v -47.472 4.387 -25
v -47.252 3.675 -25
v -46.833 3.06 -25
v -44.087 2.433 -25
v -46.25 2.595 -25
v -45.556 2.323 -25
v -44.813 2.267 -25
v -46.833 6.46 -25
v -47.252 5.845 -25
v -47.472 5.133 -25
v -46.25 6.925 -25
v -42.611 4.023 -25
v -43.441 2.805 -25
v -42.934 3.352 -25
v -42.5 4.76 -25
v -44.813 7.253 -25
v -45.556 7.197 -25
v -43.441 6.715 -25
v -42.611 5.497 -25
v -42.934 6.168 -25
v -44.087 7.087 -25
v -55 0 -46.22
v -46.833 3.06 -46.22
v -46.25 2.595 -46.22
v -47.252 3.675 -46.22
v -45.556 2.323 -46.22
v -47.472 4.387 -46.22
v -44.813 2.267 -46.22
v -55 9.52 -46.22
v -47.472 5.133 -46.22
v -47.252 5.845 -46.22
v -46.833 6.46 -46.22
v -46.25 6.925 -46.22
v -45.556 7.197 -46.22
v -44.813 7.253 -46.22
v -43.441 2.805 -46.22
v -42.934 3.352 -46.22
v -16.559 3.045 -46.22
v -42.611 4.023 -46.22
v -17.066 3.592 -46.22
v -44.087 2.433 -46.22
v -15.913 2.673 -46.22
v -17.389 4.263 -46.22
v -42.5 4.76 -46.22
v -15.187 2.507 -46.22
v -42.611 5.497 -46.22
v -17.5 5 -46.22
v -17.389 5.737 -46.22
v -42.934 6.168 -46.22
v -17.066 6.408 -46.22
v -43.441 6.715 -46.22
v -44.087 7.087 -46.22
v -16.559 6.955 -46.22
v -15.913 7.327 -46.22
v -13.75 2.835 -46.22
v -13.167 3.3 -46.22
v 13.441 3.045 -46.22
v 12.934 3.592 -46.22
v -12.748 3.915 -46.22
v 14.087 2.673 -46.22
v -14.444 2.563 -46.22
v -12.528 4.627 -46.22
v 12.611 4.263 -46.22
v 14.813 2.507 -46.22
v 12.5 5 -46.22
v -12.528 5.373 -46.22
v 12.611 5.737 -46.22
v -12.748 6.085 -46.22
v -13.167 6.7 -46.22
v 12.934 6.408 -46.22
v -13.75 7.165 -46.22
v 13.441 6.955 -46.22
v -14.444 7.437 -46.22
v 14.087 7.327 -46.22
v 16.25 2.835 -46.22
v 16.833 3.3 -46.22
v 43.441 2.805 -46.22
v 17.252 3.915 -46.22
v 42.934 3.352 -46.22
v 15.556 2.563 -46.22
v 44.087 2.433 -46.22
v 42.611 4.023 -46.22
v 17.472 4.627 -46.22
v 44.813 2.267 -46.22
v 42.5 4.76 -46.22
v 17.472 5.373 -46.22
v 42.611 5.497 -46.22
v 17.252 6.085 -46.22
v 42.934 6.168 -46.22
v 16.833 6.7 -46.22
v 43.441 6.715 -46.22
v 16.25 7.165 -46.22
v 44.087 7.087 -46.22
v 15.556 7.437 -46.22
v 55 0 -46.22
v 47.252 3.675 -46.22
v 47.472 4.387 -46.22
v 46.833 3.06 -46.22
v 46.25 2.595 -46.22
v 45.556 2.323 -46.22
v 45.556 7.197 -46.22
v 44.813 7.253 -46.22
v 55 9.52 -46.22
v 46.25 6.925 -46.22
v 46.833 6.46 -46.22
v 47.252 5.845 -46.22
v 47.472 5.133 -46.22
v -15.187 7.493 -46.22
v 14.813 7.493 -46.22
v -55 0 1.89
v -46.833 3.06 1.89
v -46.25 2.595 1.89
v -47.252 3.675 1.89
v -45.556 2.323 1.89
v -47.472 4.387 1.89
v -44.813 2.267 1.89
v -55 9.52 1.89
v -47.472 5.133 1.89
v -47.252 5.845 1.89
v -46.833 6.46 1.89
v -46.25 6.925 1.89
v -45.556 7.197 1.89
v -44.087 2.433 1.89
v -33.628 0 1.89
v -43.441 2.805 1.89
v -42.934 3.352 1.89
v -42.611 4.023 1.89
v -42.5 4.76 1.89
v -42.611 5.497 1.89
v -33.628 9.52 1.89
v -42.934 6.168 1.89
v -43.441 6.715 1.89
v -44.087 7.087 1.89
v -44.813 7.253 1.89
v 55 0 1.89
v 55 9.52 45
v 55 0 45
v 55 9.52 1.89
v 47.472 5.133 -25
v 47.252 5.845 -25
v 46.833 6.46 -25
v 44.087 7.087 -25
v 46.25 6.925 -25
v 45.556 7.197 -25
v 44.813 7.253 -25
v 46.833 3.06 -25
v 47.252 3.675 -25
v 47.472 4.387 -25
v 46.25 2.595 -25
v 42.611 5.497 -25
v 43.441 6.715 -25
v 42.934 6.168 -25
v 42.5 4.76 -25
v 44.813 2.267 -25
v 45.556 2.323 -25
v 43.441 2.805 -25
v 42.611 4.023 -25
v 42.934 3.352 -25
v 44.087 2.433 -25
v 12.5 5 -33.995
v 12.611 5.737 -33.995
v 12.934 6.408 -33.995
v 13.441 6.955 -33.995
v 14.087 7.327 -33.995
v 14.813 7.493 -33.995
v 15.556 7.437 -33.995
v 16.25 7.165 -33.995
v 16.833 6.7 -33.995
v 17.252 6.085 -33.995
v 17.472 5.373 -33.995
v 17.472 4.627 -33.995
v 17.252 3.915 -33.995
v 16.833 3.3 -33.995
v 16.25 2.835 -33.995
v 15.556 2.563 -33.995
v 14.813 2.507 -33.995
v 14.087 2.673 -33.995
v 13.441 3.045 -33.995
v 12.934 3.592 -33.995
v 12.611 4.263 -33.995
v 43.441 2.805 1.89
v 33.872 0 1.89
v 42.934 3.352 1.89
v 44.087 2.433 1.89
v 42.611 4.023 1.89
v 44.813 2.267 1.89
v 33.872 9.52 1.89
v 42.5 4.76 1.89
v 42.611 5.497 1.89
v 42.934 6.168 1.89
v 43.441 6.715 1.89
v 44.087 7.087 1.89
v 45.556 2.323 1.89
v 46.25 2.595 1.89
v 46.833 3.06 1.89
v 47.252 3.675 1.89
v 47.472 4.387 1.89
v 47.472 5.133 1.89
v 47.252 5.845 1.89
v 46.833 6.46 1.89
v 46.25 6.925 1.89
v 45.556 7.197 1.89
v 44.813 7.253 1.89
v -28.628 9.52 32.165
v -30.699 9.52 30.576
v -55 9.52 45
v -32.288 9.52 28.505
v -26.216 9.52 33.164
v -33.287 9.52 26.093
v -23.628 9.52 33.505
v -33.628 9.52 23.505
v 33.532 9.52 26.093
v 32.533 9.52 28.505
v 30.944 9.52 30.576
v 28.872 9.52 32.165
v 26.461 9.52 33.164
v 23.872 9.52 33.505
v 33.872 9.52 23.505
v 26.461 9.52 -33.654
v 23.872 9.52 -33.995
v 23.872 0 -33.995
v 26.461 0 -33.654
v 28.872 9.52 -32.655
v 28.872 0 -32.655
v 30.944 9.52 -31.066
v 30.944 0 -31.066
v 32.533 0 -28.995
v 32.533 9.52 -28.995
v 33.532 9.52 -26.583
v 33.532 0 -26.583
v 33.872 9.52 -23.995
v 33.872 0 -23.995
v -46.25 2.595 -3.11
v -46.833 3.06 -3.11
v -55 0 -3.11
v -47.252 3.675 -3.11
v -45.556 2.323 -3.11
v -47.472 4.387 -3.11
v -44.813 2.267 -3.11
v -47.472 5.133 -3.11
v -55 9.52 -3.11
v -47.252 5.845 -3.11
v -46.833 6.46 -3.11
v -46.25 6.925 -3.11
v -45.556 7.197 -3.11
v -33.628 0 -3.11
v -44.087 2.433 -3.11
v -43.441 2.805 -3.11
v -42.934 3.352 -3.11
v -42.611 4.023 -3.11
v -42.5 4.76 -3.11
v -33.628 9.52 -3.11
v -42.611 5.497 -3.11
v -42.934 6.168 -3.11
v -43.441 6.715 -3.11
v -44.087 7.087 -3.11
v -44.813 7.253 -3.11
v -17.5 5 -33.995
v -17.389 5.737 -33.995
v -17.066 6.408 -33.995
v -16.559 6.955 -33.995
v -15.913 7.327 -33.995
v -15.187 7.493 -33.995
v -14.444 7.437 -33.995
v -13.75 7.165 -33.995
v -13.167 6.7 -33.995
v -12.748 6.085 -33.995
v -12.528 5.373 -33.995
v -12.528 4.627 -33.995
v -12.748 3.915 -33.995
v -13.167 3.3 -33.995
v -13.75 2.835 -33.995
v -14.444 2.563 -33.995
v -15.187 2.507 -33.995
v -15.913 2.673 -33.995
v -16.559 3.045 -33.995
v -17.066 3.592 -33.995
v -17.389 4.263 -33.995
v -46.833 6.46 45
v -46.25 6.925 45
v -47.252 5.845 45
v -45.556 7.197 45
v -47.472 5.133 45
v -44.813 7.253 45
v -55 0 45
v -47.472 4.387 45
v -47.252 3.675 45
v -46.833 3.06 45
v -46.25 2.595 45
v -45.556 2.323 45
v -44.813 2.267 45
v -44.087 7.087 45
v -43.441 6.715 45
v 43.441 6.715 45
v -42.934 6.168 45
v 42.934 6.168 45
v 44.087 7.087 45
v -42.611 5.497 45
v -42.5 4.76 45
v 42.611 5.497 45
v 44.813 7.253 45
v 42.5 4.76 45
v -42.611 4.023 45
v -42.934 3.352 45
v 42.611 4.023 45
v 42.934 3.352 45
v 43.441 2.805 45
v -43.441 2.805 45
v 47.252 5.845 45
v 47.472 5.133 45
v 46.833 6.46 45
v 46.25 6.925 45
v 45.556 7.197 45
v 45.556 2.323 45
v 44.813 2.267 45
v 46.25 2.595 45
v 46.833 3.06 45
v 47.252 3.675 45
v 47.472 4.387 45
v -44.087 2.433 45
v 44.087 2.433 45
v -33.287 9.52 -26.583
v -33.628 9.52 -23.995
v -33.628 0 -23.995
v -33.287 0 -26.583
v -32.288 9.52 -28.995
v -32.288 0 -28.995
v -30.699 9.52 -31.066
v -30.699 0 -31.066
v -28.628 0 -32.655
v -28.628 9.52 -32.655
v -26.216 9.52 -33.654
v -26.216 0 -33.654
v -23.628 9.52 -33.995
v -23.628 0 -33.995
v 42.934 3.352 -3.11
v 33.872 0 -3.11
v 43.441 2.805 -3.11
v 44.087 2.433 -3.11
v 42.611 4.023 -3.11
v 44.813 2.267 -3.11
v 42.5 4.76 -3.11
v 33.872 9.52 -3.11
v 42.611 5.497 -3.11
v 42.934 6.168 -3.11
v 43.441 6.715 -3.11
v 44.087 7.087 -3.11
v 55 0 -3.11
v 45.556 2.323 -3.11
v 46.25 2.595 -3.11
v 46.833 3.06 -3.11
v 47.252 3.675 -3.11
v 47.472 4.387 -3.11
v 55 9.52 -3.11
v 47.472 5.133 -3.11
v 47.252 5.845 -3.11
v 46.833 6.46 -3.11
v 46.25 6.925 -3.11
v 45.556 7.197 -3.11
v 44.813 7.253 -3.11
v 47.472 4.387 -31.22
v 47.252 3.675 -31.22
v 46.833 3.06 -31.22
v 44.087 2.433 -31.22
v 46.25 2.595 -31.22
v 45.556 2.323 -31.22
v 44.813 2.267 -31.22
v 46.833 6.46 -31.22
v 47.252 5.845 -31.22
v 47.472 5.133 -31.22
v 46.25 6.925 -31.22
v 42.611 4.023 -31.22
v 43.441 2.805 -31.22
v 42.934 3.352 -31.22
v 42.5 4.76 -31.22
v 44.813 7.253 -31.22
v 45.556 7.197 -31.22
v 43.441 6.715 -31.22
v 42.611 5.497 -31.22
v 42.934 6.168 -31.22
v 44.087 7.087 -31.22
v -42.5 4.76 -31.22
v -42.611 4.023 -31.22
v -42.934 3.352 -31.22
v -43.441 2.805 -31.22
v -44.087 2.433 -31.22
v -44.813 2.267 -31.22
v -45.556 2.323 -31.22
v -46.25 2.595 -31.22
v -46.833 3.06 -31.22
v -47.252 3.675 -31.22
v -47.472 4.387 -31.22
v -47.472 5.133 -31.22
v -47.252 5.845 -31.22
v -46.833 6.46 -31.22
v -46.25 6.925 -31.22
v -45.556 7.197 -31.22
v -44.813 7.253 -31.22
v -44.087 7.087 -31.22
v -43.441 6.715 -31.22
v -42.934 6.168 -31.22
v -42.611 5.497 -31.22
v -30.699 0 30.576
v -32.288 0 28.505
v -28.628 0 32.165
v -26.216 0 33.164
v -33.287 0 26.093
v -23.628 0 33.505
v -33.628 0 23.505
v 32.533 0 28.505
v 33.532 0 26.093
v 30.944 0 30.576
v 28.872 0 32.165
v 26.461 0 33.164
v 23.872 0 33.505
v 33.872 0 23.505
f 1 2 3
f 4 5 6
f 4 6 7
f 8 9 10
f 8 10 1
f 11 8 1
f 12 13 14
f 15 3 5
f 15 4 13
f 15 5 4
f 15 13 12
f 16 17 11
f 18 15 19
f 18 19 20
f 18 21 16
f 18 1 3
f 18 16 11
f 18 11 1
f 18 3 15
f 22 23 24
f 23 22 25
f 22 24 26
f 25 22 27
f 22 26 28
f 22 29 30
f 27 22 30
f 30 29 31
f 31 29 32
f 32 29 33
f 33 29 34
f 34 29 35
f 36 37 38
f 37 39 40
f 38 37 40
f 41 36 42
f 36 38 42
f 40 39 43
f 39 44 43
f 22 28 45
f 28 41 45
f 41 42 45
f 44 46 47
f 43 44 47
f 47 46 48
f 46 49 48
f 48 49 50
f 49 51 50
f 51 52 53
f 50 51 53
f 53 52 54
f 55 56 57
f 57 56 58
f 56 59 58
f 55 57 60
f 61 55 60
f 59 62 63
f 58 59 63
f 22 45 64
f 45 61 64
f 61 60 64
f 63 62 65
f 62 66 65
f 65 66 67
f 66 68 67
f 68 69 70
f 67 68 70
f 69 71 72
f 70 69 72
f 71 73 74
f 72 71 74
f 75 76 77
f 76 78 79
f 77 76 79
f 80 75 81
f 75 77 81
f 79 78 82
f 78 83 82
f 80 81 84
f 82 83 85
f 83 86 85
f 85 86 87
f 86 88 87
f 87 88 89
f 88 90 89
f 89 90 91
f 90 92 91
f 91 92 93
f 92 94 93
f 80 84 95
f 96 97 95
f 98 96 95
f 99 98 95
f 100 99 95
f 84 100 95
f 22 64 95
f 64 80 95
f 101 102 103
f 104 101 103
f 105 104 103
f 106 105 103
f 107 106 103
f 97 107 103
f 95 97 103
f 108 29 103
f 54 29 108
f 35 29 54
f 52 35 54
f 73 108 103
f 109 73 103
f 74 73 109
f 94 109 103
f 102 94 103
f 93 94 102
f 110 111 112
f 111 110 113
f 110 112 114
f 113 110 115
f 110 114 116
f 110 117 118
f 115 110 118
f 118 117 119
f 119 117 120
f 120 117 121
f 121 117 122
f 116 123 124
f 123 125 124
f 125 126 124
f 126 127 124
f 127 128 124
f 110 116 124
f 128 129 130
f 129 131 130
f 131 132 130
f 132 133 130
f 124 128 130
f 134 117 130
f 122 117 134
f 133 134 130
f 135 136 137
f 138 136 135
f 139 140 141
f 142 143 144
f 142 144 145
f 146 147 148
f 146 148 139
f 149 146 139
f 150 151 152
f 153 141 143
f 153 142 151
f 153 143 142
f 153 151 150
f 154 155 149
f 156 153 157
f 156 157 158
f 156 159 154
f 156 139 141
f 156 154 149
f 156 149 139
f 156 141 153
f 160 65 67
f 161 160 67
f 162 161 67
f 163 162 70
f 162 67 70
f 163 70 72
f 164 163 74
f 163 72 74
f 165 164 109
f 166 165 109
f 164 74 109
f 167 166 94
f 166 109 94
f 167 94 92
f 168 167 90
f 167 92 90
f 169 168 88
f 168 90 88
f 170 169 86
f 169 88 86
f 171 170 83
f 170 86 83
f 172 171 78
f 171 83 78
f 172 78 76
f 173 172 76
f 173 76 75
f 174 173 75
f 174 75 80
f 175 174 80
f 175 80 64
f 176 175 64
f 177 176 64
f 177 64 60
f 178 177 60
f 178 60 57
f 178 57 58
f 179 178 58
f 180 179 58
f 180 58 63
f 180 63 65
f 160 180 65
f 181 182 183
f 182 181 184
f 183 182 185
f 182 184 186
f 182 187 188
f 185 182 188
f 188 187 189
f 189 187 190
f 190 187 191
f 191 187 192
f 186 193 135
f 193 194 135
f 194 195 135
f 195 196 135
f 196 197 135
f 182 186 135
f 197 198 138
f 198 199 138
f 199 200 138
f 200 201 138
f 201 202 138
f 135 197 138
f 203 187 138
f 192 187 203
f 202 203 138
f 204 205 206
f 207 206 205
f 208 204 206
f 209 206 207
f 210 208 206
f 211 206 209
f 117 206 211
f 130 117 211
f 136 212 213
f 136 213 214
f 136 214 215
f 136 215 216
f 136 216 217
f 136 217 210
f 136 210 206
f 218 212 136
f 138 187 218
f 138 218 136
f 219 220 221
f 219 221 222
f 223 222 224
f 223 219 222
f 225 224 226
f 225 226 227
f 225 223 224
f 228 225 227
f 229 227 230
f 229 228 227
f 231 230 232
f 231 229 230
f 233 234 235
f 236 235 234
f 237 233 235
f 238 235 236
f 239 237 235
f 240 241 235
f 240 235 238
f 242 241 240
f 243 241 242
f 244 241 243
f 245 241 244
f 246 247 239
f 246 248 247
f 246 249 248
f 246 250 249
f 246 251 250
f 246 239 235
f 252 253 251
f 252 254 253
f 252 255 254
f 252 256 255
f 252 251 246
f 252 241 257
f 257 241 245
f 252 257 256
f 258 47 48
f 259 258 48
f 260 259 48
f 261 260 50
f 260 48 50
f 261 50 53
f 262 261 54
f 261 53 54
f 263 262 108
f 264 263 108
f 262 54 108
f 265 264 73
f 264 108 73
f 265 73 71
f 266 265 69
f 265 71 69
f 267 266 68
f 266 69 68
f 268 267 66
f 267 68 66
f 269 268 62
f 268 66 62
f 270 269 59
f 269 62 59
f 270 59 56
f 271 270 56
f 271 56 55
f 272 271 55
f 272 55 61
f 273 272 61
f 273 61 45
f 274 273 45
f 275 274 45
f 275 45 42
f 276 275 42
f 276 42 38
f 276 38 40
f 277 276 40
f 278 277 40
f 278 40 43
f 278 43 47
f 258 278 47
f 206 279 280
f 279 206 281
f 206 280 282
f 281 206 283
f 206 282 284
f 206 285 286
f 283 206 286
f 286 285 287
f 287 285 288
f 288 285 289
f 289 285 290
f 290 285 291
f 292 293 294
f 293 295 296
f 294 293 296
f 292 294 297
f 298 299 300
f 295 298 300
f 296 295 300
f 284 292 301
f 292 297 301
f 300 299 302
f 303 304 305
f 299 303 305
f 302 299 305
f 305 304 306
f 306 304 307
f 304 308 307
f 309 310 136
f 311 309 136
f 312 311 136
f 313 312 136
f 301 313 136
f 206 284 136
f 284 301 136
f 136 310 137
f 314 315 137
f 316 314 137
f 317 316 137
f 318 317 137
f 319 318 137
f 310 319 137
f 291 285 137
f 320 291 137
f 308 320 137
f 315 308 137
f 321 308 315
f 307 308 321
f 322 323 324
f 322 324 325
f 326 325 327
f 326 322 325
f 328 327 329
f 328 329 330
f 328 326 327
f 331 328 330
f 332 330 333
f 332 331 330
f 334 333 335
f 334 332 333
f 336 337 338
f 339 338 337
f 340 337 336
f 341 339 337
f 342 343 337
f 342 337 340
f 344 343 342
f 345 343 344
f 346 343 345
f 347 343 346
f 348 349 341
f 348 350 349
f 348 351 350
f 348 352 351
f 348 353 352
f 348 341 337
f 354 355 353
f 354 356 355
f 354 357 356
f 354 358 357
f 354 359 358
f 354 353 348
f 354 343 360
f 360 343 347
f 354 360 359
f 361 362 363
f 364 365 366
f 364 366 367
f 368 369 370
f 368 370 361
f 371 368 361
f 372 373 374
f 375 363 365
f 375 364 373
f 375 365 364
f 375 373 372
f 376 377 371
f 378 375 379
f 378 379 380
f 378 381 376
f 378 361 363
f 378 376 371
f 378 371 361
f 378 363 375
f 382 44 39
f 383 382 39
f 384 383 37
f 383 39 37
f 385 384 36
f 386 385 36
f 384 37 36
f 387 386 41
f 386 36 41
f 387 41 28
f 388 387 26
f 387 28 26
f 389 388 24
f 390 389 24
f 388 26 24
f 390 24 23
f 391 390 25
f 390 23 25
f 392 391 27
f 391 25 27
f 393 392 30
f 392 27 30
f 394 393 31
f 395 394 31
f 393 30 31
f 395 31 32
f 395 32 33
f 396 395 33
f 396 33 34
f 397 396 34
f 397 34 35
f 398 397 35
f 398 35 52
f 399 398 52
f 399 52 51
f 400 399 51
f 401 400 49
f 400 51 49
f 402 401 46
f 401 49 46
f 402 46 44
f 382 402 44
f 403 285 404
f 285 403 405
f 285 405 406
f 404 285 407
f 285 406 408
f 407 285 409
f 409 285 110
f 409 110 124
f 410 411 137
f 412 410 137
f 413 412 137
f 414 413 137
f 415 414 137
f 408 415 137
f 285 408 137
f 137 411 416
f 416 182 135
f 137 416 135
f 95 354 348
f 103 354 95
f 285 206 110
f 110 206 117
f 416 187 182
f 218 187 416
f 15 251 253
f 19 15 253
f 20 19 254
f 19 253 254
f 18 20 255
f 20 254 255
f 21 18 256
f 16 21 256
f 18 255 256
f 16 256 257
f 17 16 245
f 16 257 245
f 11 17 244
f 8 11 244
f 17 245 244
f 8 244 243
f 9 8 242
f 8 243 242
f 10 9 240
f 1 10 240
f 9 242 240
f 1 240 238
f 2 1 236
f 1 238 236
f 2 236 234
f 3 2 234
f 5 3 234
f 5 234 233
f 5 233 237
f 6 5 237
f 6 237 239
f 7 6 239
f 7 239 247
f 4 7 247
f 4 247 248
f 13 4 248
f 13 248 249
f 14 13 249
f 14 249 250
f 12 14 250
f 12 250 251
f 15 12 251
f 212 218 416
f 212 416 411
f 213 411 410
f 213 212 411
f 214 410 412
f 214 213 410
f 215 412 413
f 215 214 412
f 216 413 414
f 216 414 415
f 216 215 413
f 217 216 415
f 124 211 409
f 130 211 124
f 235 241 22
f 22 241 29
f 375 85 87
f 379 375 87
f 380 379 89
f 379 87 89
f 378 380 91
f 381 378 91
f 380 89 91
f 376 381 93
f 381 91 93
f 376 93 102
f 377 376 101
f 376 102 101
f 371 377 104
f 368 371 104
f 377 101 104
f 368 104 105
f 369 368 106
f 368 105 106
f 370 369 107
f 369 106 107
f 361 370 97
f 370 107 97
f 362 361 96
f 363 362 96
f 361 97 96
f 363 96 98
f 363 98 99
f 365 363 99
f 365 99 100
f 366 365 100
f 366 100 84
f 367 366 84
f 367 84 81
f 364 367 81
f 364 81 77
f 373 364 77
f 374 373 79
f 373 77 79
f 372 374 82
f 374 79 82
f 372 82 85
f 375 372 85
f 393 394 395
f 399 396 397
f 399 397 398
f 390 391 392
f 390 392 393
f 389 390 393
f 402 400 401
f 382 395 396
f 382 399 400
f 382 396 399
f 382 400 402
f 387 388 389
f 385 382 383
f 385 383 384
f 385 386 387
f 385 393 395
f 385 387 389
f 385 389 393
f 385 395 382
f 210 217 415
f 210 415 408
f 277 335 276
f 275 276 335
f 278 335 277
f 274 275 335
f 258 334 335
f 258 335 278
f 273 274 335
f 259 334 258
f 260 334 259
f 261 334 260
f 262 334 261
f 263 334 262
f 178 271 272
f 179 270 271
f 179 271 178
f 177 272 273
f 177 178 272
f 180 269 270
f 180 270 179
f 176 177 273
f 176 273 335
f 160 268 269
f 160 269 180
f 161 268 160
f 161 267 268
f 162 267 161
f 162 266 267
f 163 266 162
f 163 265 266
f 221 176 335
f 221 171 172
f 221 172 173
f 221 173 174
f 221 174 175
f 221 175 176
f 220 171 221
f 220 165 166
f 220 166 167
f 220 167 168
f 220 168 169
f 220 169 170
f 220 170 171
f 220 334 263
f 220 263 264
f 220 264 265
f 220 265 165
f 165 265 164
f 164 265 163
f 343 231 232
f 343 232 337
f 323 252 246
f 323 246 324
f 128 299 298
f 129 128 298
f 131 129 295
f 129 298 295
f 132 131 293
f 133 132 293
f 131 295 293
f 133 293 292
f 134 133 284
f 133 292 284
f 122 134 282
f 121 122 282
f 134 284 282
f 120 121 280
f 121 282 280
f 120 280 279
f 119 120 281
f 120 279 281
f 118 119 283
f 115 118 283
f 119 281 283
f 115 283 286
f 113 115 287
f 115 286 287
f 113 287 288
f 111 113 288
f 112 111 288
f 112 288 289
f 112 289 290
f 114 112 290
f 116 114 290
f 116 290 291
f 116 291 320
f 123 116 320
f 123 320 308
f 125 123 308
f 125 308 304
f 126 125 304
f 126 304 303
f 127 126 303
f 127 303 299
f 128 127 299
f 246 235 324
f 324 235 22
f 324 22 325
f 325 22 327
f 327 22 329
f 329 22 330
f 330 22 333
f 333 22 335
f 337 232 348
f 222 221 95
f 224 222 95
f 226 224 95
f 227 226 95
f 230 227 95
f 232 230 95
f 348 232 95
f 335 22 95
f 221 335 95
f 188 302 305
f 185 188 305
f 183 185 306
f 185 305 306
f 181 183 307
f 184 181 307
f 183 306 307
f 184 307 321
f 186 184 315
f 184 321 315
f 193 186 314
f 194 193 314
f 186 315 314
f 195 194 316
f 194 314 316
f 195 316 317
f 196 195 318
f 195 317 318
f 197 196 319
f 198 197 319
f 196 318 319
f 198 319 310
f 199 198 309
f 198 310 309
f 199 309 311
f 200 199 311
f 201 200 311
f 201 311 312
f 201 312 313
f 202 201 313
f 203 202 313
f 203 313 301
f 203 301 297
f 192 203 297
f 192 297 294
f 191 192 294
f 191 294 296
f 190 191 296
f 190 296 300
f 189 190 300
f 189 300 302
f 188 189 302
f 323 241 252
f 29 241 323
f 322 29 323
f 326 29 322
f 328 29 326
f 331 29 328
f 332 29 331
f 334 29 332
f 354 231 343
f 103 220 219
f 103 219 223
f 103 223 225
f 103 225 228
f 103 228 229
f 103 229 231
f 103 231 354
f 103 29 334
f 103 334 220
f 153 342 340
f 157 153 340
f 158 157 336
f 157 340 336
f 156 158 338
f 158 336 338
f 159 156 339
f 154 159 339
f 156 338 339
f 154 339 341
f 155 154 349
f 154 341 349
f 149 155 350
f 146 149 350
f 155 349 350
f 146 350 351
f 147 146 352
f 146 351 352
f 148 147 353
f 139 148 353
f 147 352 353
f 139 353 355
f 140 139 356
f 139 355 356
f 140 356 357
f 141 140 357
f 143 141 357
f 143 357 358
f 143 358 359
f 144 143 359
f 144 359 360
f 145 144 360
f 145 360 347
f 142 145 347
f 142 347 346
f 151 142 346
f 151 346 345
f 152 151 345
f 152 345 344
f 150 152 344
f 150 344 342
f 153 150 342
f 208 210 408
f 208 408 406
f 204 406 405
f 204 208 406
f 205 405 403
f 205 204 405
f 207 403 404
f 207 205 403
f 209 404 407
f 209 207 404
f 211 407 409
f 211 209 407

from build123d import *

# Parameters (mm, degrees)
ESBO_O1_W                = 110
ESBO_O1_H                = 90
RESSALTO_EXTRUS_O1_DEPTH = 9.52
ESBO_O6_W                = 110
ESBO_O6_H                = 1.22
RESSALTO_EXTRUS_O3_DEPTH = 9.52
CORTE_EXTRUS_O6_DEPTH    = 9.52
ESBO_O9_W                = 110
ESBO_O9_H                = 5
CORTE_EXTRUS_O7_DEPTH    = 9.52
ESBO_O10_R               = 2.5
CORTE_EXTRUS_O8_DEPTH    = 70
ESBO_O7_R                = 2.5
CORTE_EXTRUS_O9_DEPTH    = 15


with BuildPart() as part:
    # Esboço1 → Ressalto-extrusão1 (new body)
    with BuildSketch(Plane(origin=(0, 0, 0), x_dir=(1, 0, 0), z_dir=(0, 1, 0))):
        Rectangle(ESBO_O1_W, ESBO_O1_H)
    extrude(amount=RESSALTO_EXTRUS_O1_DEPTH)

    # Esboço6 → Ressalto-extrusão3 (add)
    with BuildSketch(Plane(origin=(0, 9.52, 0), x_dir=(1, 0, 0), z_dir=(0, 1, 0))):
        with Locations((0, 45.61)):
            Rectangle(ESBO_O6_W, ESBO_O6_H)
    extrude(amount=-RESSALTO_EXTRUS_O3_DEPTH)

    # Esboço2 → Corte-extrusão6 (cut)
    with BuildSketch(Plane(origin=(0, 9.52, 0), x_dir=(1, 0, 0), z_dir=(0, 1, 0))):
        with BuildLine():
            Line((-23.627508058, 33.994983885), (23.872491942, 33.994983885))
            ThreePointArc((23.872491942, 33.994983885), (30.943559754, 31.066051697), (33.872491942, 23.994983885))
            Line((33.872491942, 23.994983885), (33.872491942, -23.505016115))
            ThreePointArc((33.872491942, -23.505016115), (30.943559754, -30.576083927), (23.872491942, -33.505016115))
            Line((23.872491942, -33.505016115), (-23.627508058, -33.505016115))
            ThreePointArc((-23.627508058, -33.505016115), (-30.698575869, -30.576083927), (-33.627508058, -23.505016115))
            Line((-33.627508058, -23.505016115), (-33.627508058, 23.994983885))
            ThreePointArc((-33.627508058, 23.994983885), (-30.698575869, 31.066051697), (-23.627508058, 33.994983885))
        make_face()
    extrude(amount=-CORTE_EXTRUS_O6_DEPTH, mode=Mode.SUBTRACT)

    # Esboço9 → Corte-extrusão7 (cut)
    with BuildSketch(Plane(origin=(0, 9.52, 0), x_dir=(1, 0, 0), z_dir=(0, 1, 0))):
        with Locations((0, 0.61)):
            Rectangle(ESBO_O9_W, ESBO_O9_H)
    extrude(amount=-CORTE_EXTRUS_O7_DEPTH, mode=Mode.SUBTRACT)


with BuildPart() as corte_extrus_o7_piece_1:
    # of the separate pieces the step leaves, piece 1, a body of its own (corte_extrus_o7_pieces)
    add(part.part.solids().sort_by_distance((55, 9.52, -3.11))[0])


with BuildPart() as corte_extrus_o7_piece_2:
    # of the separate pieces the step leaves, piece 2, a body of its own (corte_extrus_o7_pieces)
    add(part.part.solids().sort_by_distance((55, 0, 45))[0])


with BuildPart() as corte_extrus_o8_tool:
    # Esboço10 → Corte-extrusão8 (new body)
    with BuildSketch(Plane.XY.offset(45)):
        with Locations((-45, 4.76)):
            Circle(ESBO_O10_R)
        with Locations(Location((45, 4.76, 0), (0, 0, 180))):
            Circle(ESBO_O10_R)
    extrude(amount=-CORTE_EXTRUS_O8_DEPTH)


with BuildPart() as corte_extrus_o7_piece_1_1:
    add(corte_extrus_o7_piece_1.part)

    # Corte-extrusão8: cut by corte_extrus_o8_tool
    add(corte_extrus_o8_tool.part, mode=Mode.SUBTRACT)

    # Esboço7 → Corte-extrusão9 (cut)
    with BuildSketch(Plane(origin=(0, 0, -46.22), x_dir=(-1, 0, 0), z_dir=(0, 0, -1))):
        with Locations((-45, 4.76)):
            Circle(ESBO_O7_R)
        with Locations(Location((45, 4.76, 0), (0, 0, 180))):
            Circle(ESBO_O7_R)
        with Locations((-15, 5)):
            Circle(ESBO_O7_R)
        with Locations((15, 5)):
            Circle(ESBO_O7_R)
    extrude(amount=-CORTE_EXTRUS_O9_DEPTH, mode=Mode.SUBTRACT)


with BuildPart() as corte_extrus_o7_piece_2_1:
    add(corte_extrus_o7_piece_2.part)

    # Corte-extrusão8: cut by corte_extrus_o8_tool
    add(corte_extrus_o8_tool.part, mode=Mode.SUBTRACT)


solid = Compound([corte_extrus_o7_piece_1_1.part, corte_extrus_o7_piece_2_1.part])
